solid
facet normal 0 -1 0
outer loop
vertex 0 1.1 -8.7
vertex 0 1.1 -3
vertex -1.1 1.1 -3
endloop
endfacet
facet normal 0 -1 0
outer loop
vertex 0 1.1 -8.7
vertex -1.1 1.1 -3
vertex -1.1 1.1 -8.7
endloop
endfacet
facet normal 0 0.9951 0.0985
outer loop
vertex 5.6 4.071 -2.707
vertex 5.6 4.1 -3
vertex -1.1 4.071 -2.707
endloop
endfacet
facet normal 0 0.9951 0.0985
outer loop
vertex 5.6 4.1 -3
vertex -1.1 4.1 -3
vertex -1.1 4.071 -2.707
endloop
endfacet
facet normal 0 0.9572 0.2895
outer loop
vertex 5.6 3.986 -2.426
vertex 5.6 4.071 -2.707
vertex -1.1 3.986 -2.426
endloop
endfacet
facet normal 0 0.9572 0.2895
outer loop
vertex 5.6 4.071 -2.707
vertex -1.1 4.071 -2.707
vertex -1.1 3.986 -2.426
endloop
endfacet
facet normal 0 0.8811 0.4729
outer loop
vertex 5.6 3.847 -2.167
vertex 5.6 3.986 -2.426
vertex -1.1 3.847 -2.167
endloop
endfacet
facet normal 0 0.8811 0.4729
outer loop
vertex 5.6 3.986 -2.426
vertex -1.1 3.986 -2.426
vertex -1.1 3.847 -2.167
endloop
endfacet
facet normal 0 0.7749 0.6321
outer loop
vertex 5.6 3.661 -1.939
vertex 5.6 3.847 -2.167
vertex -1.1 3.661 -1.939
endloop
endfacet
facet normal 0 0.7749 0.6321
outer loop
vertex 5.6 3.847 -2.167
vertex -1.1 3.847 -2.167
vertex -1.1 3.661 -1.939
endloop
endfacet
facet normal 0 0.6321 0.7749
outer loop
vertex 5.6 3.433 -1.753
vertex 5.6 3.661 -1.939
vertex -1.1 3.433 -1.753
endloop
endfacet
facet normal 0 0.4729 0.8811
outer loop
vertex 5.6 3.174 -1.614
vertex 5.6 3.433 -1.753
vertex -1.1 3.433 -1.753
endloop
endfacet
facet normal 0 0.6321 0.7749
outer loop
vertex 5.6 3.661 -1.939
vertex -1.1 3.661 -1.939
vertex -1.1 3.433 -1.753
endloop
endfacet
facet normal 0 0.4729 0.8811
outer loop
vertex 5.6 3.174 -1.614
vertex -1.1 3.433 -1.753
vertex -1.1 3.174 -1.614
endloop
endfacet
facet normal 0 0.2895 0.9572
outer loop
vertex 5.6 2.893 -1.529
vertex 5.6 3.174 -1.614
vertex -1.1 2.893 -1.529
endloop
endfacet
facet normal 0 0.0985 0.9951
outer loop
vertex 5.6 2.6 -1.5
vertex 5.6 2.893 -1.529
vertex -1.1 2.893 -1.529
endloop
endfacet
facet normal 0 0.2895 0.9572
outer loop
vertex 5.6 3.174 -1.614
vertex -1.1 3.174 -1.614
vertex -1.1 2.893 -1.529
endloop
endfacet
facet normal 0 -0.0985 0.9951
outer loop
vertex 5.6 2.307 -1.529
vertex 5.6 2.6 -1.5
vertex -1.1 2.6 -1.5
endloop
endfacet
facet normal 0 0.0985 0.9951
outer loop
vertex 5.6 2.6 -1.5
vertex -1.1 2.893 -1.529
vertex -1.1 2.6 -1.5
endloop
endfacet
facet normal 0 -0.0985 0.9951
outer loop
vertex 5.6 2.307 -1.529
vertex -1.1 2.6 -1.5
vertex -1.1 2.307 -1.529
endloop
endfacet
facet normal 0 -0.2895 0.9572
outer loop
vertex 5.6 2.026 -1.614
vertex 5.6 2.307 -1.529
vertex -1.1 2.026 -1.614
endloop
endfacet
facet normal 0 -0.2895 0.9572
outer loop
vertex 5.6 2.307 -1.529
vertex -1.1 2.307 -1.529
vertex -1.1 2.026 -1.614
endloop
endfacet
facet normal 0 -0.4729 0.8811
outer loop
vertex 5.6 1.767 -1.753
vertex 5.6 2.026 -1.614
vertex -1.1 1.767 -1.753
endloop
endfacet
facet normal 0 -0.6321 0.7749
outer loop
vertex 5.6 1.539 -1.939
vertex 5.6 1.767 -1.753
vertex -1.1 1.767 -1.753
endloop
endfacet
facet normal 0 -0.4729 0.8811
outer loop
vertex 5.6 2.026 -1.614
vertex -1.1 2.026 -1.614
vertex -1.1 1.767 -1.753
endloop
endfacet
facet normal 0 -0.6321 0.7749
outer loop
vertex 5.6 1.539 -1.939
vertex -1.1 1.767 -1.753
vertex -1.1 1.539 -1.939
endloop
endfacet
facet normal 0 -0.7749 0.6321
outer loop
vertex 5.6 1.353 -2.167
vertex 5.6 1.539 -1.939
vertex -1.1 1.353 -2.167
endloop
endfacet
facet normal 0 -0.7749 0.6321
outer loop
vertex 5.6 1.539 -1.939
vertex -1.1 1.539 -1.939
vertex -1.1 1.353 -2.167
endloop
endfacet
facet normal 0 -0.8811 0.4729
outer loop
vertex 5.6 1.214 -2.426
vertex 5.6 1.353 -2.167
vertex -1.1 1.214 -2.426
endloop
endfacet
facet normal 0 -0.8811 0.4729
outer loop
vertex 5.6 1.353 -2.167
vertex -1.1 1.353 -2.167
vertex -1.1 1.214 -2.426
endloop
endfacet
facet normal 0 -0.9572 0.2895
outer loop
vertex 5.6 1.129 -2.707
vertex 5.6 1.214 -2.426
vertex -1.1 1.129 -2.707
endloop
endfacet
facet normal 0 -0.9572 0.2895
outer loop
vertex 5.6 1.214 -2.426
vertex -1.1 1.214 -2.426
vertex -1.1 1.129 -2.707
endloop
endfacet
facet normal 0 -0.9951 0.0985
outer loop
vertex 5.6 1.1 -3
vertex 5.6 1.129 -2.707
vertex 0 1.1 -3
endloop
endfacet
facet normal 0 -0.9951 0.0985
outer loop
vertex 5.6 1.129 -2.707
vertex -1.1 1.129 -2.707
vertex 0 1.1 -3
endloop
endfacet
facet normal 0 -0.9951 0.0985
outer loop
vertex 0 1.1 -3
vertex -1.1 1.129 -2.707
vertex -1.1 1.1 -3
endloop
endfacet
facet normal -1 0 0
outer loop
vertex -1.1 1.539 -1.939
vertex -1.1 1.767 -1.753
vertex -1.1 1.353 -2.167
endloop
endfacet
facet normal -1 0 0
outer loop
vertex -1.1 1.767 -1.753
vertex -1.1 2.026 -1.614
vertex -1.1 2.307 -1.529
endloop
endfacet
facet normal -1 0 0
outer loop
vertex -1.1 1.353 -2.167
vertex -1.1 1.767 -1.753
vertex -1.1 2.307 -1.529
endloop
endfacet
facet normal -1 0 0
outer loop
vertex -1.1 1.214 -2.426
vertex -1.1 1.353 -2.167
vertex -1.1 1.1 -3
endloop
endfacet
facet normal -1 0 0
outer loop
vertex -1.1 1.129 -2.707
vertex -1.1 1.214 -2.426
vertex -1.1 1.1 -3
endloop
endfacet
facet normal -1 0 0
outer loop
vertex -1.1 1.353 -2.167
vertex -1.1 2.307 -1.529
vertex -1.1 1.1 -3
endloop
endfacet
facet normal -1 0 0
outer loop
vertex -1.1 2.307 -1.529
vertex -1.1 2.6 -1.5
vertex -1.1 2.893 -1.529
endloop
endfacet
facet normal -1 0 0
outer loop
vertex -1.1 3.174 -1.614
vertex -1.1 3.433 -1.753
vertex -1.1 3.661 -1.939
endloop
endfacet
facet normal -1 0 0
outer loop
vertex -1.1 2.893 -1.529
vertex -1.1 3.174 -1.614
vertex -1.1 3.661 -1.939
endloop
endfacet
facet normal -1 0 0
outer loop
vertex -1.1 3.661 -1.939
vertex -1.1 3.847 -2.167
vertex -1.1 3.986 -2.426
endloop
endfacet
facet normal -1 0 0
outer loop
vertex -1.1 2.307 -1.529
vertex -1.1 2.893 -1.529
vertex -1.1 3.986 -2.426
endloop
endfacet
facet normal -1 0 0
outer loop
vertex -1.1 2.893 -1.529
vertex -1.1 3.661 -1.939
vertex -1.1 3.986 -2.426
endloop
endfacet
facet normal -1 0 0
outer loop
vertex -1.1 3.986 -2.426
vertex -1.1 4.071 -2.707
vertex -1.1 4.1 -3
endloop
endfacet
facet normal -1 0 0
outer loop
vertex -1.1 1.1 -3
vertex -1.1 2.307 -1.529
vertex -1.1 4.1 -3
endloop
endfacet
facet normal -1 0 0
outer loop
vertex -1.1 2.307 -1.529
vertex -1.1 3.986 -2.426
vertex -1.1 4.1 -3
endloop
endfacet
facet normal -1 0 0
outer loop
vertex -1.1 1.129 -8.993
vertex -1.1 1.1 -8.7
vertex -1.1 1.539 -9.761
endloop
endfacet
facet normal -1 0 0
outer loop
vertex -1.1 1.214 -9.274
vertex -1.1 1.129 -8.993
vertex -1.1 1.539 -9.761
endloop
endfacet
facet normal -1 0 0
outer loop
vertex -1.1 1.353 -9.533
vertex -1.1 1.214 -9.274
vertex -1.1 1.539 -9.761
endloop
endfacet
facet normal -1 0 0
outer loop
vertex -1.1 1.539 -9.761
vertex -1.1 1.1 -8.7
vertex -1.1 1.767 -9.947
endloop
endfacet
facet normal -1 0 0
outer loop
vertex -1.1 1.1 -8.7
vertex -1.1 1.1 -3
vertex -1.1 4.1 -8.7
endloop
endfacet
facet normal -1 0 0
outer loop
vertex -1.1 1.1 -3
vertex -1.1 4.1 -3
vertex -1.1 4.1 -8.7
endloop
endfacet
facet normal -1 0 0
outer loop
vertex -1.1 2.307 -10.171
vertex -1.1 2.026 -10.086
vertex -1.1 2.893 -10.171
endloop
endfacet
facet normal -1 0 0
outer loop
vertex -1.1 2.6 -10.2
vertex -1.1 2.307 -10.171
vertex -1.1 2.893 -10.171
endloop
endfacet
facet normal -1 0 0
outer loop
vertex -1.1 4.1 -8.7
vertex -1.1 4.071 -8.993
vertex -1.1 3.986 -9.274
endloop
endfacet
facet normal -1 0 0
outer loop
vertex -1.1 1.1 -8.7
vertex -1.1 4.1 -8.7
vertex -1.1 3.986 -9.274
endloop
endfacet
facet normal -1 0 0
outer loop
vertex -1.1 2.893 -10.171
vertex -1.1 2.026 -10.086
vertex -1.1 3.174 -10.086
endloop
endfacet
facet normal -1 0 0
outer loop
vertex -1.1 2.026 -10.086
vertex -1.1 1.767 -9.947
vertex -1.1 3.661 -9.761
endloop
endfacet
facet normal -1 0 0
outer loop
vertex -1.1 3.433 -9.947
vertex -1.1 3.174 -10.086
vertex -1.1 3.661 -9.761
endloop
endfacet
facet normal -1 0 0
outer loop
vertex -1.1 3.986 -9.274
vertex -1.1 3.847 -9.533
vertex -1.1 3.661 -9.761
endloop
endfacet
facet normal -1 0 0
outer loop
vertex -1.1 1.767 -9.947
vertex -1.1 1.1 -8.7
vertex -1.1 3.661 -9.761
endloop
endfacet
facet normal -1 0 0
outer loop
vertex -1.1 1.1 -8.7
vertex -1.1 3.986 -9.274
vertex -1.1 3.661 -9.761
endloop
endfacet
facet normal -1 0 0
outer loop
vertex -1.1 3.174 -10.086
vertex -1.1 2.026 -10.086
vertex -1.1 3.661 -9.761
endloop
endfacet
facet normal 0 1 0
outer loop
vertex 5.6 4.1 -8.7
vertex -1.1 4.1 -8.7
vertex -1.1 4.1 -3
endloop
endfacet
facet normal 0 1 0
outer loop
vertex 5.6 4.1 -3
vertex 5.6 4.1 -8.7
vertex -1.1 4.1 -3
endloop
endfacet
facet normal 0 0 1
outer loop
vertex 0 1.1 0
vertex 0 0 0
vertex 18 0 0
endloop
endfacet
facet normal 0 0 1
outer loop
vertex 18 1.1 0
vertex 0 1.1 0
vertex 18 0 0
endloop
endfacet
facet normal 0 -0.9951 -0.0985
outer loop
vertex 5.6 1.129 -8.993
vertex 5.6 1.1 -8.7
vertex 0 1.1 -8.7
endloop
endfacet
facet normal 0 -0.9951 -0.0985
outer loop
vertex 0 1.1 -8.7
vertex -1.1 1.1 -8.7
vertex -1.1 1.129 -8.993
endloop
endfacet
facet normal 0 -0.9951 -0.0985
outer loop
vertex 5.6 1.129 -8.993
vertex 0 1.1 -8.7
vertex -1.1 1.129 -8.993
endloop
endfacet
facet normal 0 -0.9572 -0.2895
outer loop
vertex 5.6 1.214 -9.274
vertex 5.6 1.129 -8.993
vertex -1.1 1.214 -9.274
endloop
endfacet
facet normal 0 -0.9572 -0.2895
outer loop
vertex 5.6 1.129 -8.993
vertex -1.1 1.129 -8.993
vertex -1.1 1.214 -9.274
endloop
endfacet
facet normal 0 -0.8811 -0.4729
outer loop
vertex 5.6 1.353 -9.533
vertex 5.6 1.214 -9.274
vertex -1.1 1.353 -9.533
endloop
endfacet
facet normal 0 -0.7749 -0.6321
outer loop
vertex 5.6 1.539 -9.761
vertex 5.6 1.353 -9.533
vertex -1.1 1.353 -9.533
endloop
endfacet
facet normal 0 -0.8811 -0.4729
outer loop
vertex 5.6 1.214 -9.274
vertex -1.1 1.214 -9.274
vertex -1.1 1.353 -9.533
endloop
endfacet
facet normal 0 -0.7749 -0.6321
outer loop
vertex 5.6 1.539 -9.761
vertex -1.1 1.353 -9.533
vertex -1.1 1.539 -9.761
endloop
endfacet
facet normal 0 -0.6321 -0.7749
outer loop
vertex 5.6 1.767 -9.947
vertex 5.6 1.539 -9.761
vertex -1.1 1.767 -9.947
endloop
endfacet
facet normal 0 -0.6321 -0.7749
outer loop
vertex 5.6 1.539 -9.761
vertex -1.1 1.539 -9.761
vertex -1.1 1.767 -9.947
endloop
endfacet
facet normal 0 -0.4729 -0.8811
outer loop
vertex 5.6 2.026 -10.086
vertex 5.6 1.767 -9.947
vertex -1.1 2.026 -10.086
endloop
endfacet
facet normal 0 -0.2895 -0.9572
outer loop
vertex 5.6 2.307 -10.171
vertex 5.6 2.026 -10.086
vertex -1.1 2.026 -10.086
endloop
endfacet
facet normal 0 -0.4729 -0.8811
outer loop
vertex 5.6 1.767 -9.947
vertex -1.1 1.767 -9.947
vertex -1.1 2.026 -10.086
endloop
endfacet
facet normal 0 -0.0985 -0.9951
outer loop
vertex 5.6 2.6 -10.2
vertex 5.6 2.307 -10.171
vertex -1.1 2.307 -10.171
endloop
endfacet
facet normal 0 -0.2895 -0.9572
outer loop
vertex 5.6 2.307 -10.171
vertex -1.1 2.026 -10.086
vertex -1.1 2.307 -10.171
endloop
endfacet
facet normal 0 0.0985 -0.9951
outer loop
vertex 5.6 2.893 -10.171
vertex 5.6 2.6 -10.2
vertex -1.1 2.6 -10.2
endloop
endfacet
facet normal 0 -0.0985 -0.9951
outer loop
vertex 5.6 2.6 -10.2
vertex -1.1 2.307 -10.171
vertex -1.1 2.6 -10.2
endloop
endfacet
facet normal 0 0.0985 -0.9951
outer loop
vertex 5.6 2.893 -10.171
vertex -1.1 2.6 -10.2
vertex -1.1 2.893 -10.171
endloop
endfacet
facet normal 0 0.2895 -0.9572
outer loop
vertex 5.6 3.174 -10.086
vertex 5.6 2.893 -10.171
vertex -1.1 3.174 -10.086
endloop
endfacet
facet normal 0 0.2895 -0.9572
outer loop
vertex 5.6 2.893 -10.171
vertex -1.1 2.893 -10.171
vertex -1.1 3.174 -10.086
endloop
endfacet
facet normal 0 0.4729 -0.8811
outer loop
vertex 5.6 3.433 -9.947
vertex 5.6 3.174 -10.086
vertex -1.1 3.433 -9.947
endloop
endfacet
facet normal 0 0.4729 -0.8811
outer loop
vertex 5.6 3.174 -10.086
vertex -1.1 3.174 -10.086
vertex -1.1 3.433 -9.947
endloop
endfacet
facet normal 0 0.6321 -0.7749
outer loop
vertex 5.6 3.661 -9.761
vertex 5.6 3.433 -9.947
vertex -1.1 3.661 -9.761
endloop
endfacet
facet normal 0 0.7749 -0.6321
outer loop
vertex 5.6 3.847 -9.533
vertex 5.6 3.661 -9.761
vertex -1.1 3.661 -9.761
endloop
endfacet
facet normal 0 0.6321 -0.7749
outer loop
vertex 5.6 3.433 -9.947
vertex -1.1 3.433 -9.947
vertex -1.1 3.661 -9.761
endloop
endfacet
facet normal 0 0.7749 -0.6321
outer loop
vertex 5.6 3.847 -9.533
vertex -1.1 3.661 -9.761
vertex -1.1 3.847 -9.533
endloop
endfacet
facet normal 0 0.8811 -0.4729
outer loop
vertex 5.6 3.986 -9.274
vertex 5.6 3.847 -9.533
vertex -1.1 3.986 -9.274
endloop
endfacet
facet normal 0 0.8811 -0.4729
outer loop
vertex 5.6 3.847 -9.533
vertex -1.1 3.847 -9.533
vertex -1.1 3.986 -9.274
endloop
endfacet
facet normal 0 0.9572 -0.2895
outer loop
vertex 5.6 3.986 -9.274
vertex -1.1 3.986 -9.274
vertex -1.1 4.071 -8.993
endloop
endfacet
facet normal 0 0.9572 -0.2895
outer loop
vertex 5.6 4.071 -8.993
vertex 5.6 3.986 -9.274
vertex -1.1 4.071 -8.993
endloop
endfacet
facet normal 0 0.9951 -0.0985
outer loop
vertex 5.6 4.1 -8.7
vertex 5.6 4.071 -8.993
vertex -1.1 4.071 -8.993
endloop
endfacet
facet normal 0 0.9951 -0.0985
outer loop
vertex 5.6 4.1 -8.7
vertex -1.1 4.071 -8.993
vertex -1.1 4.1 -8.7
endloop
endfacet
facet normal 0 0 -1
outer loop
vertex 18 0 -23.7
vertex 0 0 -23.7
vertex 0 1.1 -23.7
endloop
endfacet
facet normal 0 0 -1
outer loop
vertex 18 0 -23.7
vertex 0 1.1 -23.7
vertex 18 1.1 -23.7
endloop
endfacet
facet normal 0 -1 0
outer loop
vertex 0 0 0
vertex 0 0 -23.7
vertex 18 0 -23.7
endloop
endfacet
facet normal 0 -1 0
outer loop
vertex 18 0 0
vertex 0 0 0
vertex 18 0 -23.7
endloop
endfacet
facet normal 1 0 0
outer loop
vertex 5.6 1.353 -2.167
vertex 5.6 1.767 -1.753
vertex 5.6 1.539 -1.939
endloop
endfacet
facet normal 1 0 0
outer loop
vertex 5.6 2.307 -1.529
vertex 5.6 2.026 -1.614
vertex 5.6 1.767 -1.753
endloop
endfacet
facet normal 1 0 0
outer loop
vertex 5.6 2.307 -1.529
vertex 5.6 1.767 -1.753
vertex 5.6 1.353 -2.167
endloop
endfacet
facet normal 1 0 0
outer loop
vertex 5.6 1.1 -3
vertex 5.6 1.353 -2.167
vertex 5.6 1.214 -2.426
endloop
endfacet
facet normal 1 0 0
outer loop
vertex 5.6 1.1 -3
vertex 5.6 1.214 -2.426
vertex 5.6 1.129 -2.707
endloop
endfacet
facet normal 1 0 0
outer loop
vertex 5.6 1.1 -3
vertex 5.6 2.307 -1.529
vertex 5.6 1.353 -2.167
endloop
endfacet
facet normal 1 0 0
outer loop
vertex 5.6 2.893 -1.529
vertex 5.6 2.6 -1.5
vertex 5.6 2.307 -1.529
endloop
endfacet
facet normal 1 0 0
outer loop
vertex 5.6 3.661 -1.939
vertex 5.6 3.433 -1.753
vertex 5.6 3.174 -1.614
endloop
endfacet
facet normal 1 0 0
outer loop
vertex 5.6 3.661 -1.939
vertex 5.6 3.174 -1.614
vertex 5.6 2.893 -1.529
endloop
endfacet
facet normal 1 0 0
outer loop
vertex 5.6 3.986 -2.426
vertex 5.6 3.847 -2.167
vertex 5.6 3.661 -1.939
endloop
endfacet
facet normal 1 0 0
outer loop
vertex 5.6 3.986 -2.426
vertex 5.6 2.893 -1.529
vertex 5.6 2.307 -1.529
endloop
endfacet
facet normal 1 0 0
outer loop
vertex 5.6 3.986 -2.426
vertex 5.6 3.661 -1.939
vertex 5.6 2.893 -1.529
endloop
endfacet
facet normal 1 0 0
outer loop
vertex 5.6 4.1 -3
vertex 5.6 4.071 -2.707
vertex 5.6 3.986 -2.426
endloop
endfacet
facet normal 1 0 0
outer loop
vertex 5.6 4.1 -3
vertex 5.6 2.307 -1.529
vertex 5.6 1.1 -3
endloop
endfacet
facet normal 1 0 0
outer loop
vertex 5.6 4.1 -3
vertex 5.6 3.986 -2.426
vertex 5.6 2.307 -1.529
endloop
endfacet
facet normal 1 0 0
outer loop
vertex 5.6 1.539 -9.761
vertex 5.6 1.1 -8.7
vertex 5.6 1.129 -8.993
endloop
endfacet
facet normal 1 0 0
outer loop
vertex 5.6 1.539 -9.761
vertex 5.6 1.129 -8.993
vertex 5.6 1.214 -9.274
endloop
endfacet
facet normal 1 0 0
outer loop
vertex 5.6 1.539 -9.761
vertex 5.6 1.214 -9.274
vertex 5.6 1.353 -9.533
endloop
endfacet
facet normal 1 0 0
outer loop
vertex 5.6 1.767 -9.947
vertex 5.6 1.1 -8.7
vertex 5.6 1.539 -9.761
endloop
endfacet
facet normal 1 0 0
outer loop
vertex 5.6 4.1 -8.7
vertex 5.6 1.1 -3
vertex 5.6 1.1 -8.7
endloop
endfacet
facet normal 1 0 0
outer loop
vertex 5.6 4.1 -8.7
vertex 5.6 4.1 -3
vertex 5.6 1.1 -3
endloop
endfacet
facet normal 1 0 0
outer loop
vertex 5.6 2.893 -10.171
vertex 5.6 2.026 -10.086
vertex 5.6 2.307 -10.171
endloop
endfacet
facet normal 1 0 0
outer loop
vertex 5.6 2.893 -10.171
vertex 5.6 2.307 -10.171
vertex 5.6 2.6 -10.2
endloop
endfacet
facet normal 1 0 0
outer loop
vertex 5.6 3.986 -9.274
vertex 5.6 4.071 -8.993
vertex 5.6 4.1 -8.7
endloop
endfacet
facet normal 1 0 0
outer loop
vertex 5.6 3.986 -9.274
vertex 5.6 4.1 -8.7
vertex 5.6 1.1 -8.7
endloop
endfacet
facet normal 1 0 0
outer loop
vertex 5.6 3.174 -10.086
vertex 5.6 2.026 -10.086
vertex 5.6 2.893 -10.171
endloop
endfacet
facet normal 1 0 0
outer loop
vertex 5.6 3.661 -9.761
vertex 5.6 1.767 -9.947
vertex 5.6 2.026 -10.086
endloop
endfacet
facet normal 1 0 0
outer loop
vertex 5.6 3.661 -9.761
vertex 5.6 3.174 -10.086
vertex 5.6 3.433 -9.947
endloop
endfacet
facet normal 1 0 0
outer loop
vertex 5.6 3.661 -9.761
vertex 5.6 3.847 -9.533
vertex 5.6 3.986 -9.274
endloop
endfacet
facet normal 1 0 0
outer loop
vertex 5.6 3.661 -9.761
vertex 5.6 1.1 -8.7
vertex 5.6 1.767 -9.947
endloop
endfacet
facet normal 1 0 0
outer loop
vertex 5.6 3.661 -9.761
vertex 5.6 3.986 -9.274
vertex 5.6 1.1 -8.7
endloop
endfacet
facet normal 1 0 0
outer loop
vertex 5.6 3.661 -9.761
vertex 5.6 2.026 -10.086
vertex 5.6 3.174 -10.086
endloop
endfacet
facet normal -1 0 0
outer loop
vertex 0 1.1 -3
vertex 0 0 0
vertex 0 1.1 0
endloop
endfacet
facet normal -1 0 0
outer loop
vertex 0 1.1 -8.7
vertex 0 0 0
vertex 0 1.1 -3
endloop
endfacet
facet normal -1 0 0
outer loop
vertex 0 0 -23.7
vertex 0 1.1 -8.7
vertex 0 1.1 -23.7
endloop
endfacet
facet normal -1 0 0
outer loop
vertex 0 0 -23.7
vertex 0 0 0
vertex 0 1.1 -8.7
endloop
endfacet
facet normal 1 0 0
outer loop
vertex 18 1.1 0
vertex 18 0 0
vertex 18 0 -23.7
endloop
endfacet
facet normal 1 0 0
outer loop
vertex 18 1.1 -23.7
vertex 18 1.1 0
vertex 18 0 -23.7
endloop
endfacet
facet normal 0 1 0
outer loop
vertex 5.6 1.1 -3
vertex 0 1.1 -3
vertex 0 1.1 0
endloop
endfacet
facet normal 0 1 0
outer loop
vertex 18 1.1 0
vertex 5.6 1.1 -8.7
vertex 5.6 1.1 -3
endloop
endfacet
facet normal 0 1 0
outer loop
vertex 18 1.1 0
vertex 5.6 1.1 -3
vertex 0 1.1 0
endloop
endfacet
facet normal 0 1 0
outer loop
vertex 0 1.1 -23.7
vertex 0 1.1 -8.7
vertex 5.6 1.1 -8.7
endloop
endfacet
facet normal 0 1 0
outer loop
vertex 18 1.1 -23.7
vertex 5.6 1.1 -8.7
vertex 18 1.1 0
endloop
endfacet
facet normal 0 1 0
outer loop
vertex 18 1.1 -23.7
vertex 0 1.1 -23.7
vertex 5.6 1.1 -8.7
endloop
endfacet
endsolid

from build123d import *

# Parameters (mm, degrees)
ESBO_O1_W                     = 18
ESBO_O1_H                     = 23.7
RESSALTO_EXTRUS_O1_DEPTH      = 1.1
RESSALTO_EXTRUS_O2_DEPTH      = 1.1
RESSALTO_EXTRUS_O2_DEPTH_BACK = 5.6


with BuildPart() as part:
    # Esboço1 → Ressalto-extrusão1 (new body)
    with BuildSketch(Plane(origin=(0, 0, 0), x_dir=(1, 0, 0), z_dir=(0, 1, 0))):
        with Locations((9, 11.85)):
            Rectangle(ESBO_O1_W, ESBO_O1_H)
    extrude(amount=RESSALTO_EXTRUS_O1_DEPTH)

    # Esboço2 → Ressalto-extrusão2 (add, two sides)
    with BuildSketch(Plane.ZY) as ressalto_extrus_o2_sk:
        with BuildLine():
            Line((-8.7, 4.1), (-3, 4.1))
            ThreePointArc((-3, 4.1), (-1.5, 2.6), (-3, 1.1))
            Line((-3, 1.1), (-8.7, 1.1))
            ThreePointArc((-8.7, 1.1), (-10.2, 2.6), (-8.7, 4.1))
        make_face()
    extrude(amount=RESSALTO_EXTRUS_O2_DEPTH)
    extrude(ressalto_extrus_o2_sk.sketch, amount=-RESSALTO_EXTRUS_O2_DEPTH_BACK)


solid = part.part
